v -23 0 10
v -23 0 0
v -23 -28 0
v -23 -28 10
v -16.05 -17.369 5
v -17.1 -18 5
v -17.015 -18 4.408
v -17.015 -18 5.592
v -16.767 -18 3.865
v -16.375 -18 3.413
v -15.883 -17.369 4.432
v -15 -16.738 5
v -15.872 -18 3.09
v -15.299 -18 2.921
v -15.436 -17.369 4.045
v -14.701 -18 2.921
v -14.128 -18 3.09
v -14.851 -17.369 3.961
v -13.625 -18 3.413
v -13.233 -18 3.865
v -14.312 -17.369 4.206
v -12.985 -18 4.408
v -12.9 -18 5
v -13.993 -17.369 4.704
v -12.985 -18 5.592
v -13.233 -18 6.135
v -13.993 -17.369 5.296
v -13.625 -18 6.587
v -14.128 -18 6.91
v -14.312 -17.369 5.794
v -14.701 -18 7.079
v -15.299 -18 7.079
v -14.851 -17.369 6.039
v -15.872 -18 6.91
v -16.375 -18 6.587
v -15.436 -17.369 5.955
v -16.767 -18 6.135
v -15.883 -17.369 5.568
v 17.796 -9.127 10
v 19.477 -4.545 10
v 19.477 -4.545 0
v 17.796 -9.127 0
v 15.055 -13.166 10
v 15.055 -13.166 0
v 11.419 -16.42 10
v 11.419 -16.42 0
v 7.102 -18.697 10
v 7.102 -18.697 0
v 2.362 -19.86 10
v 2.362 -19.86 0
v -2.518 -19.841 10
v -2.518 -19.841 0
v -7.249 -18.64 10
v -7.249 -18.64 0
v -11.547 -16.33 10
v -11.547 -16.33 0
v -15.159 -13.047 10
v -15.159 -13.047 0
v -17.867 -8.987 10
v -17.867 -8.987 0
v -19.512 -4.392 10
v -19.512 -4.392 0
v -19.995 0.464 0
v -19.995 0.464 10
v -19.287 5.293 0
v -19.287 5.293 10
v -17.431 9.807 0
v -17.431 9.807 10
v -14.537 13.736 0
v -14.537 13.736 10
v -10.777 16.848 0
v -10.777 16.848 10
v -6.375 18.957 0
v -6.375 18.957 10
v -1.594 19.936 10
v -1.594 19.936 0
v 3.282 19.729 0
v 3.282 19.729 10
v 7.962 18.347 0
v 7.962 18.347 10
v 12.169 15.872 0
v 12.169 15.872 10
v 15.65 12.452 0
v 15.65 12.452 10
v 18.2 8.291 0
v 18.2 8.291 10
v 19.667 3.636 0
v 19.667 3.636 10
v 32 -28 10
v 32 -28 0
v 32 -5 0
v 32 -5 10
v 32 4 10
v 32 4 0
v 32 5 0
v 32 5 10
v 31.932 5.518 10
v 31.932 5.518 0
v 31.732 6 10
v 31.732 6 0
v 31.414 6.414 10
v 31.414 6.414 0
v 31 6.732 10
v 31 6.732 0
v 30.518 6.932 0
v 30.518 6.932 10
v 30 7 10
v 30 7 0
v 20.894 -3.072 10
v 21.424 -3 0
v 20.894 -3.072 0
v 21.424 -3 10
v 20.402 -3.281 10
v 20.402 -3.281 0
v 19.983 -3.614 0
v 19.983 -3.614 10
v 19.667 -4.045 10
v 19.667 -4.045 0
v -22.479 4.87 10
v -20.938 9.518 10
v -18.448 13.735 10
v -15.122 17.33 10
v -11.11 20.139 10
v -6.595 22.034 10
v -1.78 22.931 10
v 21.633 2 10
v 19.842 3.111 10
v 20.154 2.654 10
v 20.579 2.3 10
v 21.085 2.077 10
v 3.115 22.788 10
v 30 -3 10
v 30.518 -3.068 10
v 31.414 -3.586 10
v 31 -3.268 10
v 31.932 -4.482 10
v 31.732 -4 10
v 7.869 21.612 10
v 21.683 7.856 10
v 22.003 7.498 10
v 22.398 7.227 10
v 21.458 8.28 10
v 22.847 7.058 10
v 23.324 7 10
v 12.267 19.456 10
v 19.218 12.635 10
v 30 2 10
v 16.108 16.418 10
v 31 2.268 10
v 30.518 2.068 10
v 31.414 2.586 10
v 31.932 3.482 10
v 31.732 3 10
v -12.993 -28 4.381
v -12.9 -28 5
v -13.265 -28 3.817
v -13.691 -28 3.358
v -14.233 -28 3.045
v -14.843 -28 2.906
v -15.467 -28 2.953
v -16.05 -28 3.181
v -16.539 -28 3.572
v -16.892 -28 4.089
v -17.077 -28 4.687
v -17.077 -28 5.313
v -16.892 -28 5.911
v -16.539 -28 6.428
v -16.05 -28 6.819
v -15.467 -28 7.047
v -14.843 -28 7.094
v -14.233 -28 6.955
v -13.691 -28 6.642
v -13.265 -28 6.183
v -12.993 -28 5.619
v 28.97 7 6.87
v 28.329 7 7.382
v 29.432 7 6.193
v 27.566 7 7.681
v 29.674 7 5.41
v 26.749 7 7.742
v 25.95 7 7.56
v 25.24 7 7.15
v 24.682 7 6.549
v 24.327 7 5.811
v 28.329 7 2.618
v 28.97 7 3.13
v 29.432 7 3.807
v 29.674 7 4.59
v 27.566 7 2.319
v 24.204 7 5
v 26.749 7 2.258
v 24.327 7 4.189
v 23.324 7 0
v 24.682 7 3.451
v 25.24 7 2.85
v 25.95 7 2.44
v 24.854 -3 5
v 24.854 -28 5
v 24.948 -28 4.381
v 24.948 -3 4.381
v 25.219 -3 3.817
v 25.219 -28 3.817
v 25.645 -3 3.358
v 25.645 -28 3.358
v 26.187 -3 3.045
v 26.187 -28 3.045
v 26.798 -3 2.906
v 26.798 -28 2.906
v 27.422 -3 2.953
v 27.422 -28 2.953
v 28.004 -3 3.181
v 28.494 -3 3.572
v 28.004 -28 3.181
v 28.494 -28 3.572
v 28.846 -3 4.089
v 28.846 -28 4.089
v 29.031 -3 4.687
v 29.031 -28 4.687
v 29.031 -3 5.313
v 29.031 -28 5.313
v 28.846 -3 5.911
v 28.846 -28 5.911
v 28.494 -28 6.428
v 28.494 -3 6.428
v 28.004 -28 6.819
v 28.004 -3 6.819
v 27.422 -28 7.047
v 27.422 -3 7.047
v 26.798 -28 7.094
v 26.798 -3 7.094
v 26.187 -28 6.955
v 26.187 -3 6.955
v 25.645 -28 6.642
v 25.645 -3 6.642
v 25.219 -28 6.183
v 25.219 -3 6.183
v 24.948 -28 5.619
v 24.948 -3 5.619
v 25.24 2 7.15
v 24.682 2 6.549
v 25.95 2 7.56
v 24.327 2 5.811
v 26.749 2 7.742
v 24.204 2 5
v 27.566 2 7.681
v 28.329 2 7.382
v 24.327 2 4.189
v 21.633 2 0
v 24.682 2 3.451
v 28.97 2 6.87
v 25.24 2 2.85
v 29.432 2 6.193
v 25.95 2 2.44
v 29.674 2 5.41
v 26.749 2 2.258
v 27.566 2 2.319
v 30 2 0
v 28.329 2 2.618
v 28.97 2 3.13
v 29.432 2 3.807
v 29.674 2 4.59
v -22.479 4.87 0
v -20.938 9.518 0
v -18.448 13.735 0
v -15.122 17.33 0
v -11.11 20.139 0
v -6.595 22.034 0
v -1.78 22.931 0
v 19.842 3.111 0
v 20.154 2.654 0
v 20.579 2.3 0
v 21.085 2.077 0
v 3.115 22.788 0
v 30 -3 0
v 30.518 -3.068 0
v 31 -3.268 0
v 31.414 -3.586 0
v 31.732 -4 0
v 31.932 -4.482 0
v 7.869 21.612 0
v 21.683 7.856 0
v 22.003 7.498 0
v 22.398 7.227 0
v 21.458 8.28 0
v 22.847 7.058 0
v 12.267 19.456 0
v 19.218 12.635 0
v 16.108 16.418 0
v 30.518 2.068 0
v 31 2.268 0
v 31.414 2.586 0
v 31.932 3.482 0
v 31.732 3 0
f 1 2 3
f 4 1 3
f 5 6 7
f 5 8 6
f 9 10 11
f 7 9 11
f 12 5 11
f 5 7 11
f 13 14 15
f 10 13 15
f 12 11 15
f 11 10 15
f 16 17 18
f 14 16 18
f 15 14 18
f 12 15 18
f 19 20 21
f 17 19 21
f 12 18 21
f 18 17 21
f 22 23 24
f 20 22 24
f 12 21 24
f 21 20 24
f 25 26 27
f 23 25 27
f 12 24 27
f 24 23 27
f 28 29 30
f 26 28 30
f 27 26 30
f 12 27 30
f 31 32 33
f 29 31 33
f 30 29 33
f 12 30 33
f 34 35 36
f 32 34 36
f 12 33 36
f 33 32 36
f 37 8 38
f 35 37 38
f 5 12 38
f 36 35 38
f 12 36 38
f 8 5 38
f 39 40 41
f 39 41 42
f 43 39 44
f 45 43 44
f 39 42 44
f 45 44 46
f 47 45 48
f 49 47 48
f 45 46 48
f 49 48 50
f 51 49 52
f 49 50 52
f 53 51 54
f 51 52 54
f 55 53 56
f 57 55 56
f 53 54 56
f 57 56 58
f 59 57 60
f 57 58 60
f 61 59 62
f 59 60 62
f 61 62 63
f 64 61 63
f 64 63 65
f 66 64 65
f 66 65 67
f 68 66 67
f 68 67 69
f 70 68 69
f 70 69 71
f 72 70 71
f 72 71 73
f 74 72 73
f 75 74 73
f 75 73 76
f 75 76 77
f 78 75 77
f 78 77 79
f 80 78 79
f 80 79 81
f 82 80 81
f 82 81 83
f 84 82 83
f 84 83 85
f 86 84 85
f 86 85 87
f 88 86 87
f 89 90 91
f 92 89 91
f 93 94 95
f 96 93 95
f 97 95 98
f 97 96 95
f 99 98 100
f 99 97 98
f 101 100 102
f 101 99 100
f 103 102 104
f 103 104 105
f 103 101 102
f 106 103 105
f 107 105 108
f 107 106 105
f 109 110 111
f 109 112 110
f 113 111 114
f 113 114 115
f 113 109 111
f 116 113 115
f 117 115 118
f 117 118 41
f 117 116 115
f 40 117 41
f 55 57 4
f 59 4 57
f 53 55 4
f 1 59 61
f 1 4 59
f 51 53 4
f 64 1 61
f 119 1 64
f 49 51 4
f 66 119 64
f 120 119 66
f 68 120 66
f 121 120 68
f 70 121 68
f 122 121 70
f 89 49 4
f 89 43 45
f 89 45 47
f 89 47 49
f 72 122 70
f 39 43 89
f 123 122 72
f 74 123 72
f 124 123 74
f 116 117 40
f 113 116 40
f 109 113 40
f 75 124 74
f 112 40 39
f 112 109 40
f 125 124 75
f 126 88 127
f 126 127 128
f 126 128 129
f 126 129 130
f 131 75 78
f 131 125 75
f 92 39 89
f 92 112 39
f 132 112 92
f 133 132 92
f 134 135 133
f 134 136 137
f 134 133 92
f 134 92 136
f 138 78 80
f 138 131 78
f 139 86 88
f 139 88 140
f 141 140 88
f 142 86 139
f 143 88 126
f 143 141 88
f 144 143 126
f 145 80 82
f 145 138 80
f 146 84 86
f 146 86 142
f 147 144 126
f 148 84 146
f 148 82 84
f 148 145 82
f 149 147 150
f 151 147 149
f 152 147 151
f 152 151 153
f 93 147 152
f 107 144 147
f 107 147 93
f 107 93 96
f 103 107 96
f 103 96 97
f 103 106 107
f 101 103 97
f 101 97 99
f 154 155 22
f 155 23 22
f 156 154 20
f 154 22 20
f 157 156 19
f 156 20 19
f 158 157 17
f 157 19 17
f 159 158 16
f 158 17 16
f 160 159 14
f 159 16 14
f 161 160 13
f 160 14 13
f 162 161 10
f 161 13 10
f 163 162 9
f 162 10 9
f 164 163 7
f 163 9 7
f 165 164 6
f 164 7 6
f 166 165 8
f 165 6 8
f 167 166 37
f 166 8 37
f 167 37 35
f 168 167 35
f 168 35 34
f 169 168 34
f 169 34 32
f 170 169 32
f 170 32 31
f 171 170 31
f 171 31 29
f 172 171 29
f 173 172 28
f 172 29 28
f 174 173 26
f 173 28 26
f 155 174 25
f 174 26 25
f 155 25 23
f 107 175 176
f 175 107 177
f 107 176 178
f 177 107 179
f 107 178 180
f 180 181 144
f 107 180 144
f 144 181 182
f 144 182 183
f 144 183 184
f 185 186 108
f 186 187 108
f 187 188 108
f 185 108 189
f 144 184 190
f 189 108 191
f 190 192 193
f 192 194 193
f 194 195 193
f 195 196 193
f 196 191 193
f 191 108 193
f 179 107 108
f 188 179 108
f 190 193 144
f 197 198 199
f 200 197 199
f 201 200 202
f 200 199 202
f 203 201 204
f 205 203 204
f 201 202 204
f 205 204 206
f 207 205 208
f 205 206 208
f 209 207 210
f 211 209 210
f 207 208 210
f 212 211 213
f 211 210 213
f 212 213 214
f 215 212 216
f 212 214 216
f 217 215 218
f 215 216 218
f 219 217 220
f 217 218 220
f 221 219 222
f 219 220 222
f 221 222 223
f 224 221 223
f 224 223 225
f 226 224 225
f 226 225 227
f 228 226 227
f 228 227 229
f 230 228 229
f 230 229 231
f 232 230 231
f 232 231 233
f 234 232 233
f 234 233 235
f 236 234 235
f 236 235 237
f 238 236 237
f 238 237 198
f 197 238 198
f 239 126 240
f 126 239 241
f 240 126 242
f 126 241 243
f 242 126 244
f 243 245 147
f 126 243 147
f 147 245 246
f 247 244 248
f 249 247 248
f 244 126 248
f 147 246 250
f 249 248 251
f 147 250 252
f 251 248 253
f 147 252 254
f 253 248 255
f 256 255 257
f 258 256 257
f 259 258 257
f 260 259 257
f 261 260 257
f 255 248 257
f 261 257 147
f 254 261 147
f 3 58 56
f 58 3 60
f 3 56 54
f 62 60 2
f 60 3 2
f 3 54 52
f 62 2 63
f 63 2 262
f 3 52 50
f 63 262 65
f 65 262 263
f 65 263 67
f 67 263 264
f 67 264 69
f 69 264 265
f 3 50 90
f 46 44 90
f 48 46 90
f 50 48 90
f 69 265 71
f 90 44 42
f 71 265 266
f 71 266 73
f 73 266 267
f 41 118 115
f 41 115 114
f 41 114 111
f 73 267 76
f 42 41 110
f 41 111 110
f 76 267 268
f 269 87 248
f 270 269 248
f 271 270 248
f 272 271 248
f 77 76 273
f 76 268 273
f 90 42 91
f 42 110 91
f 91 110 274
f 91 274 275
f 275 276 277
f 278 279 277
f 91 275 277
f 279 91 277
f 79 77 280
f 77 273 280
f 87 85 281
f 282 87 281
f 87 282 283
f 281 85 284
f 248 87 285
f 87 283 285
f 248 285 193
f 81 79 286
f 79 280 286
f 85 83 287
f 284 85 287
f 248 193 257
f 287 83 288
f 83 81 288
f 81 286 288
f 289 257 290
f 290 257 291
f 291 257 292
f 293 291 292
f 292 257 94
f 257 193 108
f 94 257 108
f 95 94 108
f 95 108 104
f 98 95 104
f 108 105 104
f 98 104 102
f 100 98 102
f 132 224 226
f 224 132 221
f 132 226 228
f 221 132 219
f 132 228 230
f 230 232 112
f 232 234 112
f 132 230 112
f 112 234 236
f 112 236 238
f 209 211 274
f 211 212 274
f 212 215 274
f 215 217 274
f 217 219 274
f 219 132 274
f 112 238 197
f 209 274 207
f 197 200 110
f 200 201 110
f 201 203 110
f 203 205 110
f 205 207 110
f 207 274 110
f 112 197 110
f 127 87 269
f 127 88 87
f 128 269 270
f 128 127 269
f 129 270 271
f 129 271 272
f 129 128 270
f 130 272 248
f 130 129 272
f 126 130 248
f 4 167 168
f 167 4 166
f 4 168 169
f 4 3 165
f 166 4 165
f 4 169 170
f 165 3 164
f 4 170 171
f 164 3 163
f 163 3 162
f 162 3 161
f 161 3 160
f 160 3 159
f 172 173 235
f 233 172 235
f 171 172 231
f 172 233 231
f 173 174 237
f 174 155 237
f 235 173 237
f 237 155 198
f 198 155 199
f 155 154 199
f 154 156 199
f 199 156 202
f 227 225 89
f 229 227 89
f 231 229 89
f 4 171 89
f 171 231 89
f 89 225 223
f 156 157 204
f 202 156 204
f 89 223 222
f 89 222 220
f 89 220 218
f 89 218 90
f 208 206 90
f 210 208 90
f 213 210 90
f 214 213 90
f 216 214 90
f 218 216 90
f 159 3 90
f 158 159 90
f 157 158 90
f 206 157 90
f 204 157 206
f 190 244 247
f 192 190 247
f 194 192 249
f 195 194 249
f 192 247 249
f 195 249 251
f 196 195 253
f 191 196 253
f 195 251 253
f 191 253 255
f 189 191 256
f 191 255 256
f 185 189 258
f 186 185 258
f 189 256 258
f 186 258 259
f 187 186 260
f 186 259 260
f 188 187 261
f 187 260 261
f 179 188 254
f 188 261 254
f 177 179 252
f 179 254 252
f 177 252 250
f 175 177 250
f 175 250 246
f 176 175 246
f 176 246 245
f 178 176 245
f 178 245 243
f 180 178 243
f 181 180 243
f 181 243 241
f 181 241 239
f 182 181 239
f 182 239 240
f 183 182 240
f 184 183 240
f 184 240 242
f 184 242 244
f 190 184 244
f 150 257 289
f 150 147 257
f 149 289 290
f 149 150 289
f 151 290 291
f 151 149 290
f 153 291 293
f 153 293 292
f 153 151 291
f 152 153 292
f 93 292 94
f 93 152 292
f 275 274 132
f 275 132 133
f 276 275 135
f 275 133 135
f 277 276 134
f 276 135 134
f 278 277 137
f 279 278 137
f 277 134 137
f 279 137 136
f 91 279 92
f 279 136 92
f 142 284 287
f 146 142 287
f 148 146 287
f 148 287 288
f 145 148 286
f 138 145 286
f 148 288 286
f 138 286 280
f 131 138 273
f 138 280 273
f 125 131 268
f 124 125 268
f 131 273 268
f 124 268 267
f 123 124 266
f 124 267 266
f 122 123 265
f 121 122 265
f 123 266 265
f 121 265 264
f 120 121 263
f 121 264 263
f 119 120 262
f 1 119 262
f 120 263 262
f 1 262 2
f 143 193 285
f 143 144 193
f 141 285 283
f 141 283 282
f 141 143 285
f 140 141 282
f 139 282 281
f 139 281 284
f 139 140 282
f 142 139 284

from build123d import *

# Parameters (mm, degrees)
EXTRUDE_1_DEPTH       = 10
FILLET_1_R            = 2
HOLE_WIZARD_M51_D     = 5.5
HOLE_WIZARD_M51_DEPTH = 5
M5X0_81_D             = 4.2
M5X0_82_D             = 4.2
M5X0_82_DEPTH         = 10
M5X0_82_TIP           = 1.2618073


with BuildPart() as part:
    # Эскиз1 → Бобышка-Вытянуть1 (new body)
    with BuildSketch(Plane.XY):
        with BuildLine():
            Line((32, -3), (19.773719933, -3))
            ThreePointArc((19.773719933, -3), (-19.993649721, 0.503955172), (19.899748742, 2))
            Line((19.899748742, 2), (32, 2))
            Line((32, 2), (32, 7))
            Line((32, 7), (21.9089023, 7))
            ThreePointArc((21.9089023, 7), (-3.54226249, 22.725588583), (-23, 0))
            Line((-23, 0), (-23, -28))
            Line((-23, -28), (32, -28))
            Line((32, -28), (32, -3))
        make_face()
    extrude(amount=EXTRUDE_1_DEPTH)

    # Скругление1
    fillet_1_edges = [part.edges().sort_by_distance(p)[0] for p in [
        (21.9089023, 7, 5),
        (32, 7, 5),
        (32, 2, 5),
        (19.899748742, 2, 5),
        (19.773719933, -3, 5),
        (32, -3, 5),
    ]]
    fillet(fillet_1_edges, radius=FILLET_1_R)

    # Отверстие с зазором M51
    with Locations(Plane(origin=(0, 7, 0), x_dir=(1, 0, 0), z_dir=(0, 1, 0))):
        with Locations((26.95445115, -5)):
            Hole(HOLE_WIZARD_M51_D / 2, depth=HOLE_WIZARD_M51_DEPTH)

    # Отверстие обработанное метчиком M5x0.81 (through all)
    with Locations(Plane(origin=(0, -3, 0), x_dir=(1, 0, 0), z_dir=(0, 1, 0))):
        with Locations((26.95445115, -5)):
            Hole(M5X0_81_D / 2)

    # Отверстие обработанное метчиком M5x0.82
    with Locations(Plane(origin=(0, -28, 0), x_dir=(-1, 0, 0), z_dir=(0, -1, 0))):
        with Locations((15, -5)):
            Hole(M5X0_82_D / 2, depth=M5X0_82_DEPTH)
            with Locations((0, 0, -(M5X0_82_DEPTH + M5X0_82_TIP / 2))):  # 118° drill point
                Cone(0, M5X0_82_D / 2, M5X0_82_TIP, mode=Mode.SUBTRACT)


solid = part.part
